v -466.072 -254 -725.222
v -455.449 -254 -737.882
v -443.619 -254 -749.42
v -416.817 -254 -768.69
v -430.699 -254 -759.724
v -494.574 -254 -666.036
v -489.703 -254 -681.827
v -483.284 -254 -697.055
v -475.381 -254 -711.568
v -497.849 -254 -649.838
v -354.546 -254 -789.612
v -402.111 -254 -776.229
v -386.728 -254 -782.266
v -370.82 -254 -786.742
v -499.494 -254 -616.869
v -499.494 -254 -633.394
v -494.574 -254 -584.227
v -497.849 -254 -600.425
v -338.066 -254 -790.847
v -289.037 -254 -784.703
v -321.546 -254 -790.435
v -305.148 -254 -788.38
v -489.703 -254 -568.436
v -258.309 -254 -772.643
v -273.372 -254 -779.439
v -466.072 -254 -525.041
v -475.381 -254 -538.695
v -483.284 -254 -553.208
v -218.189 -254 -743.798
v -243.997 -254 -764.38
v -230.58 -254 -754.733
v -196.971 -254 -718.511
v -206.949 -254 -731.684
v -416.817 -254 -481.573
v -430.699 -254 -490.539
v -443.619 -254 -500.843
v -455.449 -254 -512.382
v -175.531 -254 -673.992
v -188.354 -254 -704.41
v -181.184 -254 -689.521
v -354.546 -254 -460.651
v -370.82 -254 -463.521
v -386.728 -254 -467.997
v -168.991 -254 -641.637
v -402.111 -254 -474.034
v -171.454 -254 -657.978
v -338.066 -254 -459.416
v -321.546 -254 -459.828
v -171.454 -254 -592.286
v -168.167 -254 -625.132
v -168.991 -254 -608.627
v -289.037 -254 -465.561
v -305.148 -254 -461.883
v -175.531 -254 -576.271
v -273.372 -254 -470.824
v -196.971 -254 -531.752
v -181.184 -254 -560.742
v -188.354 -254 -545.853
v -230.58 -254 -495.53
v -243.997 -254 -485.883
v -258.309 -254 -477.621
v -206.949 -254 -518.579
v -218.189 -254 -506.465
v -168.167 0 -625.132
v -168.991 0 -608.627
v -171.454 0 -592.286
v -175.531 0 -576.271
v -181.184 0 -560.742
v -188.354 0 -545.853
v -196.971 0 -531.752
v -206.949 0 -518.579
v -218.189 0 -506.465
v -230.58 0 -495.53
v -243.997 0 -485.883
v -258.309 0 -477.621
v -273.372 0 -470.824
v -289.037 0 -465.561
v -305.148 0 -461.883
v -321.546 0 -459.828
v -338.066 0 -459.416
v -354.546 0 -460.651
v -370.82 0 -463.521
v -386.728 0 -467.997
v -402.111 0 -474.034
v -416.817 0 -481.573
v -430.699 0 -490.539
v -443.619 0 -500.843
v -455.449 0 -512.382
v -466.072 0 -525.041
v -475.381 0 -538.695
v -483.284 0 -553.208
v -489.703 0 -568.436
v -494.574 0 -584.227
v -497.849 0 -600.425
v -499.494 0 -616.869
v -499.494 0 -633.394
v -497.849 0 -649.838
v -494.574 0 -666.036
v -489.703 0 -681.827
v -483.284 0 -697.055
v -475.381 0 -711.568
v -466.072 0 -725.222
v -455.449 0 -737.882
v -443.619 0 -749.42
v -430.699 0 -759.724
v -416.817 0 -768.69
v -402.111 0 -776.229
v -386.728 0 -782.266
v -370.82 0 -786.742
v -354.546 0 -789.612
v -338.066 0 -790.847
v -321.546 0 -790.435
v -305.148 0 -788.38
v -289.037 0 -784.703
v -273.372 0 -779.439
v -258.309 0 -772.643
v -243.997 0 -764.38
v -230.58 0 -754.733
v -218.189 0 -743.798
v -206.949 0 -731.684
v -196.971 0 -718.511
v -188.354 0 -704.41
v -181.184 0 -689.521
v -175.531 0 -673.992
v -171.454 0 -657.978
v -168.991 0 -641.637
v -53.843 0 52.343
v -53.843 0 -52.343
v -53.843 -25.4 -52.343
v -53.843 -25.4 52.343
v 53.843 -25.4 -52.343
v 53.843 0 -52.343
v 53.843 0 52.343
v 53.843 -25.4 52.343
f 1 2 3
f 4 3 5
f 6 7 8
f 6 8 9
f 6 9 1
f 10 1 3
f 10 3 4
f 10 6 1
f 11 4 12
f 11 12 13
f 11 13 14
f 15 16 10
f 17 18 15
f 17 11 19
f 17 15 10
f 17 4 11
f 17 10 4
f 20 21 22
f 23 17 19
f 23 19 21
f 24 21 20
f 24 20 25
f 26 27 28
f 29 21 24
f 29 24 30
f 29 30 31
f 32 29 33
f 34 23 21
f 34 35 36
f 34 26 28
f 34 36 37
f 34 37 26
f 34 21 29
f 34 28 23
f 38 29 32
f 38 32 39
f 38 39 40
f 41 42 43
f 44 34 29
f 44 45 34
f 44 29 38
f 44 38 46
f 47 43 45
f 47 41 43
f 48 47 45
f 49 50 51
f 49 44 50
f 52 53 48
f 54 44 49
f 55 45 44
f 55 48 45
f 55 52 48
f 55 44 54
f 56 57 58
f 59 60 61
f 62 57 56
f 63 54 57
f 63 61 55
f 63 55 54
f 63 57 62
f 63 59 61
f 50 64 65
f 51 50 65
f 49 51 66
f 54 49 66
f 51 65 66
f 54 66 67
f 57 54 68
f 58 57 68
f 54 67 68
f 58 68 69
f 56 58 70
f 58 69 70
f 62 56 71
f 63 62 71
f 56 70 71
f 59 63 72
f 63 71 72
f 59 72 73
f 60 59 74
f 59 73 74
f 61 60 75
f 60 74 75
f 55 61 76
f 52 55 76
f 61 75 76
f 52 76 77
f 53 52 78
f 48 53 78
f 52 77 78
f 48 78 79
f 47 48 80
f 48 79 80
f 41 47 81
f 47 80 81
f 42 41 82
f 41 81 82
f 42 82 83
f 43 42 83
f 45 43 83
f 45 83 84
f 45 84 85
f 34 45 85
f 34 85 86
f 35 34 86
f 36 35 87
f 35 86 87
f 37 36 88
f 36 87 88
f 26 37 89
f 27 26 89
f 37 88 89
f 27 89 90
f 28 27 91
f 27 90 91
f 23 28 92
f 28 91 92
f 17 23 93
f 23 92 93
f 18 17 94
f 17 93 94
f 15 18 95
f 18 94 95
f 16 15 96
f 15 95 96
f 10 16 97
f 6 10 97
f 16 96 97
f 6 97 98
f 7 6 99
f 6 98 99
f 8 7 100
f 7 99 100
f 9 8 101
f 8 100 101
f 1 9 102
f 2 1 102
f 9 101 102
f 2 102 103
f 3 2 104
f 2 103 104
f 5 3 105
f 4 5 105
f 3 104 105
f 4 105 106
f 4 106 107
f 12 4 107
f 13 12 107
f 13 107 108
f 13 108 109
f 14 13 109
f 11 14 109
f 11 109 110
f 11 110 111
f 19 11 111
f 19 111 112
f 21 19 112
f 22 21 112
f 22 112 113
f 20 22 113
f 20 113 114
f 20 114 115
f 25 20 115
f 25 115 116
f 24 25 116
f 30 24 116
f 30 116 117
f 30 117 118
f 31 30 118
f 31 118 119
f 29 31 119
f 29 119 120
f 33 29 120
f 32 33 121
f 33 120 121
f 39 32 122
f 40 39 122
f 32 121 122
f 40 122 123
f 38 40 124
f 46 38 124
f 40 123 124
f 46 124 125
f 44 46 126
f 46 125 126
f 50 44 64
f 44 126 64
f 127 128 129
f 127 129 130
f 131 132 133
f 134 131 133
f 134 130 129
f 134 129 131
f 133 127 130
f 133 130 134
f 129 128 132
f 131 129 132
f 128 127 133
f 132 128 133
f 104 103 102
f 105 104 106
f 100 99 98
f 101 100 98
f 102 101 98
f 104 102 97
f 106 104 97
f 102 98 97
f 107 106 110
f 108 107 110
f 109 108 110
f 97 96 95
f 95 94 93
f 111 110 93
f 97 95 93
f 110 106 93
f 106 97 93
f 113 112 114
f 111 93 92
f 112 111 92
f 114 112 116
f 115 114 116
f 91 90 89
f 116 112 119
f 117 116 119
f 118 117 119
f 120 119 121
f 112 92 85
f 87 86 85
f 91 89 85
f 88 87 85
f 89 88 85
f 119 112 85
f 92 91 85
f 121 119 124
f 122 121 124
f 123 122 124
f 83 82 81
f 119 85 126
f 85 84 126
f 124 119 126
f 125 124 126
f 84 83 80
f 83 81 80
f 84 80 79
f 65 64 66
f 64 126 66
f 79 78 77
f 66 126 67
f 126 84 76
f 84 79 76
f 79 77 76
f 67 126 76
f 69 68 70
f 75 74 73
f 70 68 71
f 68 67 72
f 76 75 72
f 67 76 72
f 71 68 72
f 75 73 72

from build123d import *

# Parameters (mm, degrees)
F1_W     = 107.685536
F1_H     = 104.685948
F2_DEPTH = 25.4
F3_R     = 165.766633
F4_DEPTH = 254


with BuildPart() as f2:
    # F1 (on face) → F2 (new body)
    with BuildSketch(Plane.XZ):
        Rectangle(F1_W, F1_H)
    extrude(amount=F2_DEPTH)


with BuildPart() as f4:
    # F3 (on face) → F4 (new body)
    with BuildSketch(Plane.XZ):
        with Locations((-333.93355, -625.131581)):
            Circle(F3_R)
    extrude(amount=F4_DEPTH)


solid = Compound([f2.part, f4.part])
